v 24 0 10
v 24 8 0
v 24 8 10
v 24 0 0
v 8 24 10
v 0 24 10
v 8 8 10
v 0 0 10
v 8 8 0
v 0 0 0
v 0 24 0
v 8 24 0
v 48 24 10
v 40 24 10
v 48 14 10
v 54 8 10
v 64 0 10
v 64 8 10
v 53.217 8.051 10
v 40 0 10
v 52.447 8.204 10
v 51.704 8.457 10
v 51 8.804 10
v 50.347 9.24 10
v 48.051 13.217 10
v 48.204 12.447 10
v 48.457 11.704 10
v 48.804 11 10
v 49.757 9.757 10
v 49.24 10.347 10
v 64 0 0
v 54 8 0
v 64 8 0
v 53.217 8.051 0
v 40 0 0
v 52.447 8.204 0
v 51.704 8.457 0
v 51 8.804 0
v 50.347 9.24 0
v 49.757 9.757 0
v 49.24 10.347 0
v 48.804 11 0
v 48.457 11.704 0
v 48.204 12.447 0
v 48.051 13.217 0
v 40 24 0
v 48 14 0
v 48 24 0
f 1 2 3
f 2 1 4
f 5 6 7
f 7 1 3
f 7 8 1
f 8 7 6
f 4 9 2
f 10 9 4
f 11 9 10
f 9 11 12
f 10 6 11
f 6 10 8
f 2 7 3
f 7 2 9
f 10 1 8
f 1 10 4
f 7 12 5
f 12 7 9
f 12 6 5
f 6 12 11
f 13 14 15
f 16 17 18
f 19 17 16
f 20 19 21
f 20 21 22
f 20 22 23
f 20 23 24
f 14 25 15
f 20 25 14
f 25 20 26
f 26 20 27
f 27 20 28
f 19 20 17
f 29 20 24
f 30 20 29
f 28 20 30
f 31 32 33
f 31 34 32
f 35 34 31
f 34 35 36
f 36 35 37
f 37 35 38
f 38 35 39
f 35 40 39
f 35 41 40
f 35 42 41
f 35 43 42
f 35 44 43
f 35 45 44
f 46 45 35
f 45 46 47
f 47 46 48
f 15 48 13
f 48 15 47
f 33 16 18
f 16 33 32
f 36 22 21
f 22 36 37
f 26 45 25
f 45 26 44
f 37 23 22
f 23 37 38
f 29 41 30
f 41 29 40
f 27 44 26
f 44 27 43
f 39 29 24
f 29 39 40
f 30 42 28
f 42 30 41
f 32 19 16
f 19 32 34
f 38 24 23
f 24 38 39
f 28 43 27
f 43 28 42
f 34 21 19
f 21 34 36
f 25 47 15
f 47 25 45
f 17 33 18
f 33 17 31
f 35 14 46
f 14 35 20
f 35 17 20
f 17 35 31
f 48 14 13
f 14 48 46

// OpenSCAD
// Sharp vs. filleted internal corner: two identical L-shaped brackets
// side by side -- one with a sharp internal 90deg corner, one with a
// filleted internal corner.
$fn = 48;
leg = 24; arm = 8; h = 10; r = 6;

module l_bracket(filleted) {
    if (!filleted) {
        union() {
            cube([leg, arm, h]);
            cube([arm, leg, h]);
        }
    } else {
        union() {
            cube([leg, arm, h]);
            cube([arm, leg, h]);
            // fillet fill at the inside corner: a patch filling the notch,
            // minus a quarter-circle at its far corner, leaves a smooth
            // concave radius blending the two inner walls
            translate([arm, arm, 0])
            difference() {
                cube([r, r, h]);
                translate([r, r, -1]) cylinder(h = h + 2, r = r);
            }
        }
    }
}

l_bracket(false);
translate([40, 0, 0]) l_bracket(true);
